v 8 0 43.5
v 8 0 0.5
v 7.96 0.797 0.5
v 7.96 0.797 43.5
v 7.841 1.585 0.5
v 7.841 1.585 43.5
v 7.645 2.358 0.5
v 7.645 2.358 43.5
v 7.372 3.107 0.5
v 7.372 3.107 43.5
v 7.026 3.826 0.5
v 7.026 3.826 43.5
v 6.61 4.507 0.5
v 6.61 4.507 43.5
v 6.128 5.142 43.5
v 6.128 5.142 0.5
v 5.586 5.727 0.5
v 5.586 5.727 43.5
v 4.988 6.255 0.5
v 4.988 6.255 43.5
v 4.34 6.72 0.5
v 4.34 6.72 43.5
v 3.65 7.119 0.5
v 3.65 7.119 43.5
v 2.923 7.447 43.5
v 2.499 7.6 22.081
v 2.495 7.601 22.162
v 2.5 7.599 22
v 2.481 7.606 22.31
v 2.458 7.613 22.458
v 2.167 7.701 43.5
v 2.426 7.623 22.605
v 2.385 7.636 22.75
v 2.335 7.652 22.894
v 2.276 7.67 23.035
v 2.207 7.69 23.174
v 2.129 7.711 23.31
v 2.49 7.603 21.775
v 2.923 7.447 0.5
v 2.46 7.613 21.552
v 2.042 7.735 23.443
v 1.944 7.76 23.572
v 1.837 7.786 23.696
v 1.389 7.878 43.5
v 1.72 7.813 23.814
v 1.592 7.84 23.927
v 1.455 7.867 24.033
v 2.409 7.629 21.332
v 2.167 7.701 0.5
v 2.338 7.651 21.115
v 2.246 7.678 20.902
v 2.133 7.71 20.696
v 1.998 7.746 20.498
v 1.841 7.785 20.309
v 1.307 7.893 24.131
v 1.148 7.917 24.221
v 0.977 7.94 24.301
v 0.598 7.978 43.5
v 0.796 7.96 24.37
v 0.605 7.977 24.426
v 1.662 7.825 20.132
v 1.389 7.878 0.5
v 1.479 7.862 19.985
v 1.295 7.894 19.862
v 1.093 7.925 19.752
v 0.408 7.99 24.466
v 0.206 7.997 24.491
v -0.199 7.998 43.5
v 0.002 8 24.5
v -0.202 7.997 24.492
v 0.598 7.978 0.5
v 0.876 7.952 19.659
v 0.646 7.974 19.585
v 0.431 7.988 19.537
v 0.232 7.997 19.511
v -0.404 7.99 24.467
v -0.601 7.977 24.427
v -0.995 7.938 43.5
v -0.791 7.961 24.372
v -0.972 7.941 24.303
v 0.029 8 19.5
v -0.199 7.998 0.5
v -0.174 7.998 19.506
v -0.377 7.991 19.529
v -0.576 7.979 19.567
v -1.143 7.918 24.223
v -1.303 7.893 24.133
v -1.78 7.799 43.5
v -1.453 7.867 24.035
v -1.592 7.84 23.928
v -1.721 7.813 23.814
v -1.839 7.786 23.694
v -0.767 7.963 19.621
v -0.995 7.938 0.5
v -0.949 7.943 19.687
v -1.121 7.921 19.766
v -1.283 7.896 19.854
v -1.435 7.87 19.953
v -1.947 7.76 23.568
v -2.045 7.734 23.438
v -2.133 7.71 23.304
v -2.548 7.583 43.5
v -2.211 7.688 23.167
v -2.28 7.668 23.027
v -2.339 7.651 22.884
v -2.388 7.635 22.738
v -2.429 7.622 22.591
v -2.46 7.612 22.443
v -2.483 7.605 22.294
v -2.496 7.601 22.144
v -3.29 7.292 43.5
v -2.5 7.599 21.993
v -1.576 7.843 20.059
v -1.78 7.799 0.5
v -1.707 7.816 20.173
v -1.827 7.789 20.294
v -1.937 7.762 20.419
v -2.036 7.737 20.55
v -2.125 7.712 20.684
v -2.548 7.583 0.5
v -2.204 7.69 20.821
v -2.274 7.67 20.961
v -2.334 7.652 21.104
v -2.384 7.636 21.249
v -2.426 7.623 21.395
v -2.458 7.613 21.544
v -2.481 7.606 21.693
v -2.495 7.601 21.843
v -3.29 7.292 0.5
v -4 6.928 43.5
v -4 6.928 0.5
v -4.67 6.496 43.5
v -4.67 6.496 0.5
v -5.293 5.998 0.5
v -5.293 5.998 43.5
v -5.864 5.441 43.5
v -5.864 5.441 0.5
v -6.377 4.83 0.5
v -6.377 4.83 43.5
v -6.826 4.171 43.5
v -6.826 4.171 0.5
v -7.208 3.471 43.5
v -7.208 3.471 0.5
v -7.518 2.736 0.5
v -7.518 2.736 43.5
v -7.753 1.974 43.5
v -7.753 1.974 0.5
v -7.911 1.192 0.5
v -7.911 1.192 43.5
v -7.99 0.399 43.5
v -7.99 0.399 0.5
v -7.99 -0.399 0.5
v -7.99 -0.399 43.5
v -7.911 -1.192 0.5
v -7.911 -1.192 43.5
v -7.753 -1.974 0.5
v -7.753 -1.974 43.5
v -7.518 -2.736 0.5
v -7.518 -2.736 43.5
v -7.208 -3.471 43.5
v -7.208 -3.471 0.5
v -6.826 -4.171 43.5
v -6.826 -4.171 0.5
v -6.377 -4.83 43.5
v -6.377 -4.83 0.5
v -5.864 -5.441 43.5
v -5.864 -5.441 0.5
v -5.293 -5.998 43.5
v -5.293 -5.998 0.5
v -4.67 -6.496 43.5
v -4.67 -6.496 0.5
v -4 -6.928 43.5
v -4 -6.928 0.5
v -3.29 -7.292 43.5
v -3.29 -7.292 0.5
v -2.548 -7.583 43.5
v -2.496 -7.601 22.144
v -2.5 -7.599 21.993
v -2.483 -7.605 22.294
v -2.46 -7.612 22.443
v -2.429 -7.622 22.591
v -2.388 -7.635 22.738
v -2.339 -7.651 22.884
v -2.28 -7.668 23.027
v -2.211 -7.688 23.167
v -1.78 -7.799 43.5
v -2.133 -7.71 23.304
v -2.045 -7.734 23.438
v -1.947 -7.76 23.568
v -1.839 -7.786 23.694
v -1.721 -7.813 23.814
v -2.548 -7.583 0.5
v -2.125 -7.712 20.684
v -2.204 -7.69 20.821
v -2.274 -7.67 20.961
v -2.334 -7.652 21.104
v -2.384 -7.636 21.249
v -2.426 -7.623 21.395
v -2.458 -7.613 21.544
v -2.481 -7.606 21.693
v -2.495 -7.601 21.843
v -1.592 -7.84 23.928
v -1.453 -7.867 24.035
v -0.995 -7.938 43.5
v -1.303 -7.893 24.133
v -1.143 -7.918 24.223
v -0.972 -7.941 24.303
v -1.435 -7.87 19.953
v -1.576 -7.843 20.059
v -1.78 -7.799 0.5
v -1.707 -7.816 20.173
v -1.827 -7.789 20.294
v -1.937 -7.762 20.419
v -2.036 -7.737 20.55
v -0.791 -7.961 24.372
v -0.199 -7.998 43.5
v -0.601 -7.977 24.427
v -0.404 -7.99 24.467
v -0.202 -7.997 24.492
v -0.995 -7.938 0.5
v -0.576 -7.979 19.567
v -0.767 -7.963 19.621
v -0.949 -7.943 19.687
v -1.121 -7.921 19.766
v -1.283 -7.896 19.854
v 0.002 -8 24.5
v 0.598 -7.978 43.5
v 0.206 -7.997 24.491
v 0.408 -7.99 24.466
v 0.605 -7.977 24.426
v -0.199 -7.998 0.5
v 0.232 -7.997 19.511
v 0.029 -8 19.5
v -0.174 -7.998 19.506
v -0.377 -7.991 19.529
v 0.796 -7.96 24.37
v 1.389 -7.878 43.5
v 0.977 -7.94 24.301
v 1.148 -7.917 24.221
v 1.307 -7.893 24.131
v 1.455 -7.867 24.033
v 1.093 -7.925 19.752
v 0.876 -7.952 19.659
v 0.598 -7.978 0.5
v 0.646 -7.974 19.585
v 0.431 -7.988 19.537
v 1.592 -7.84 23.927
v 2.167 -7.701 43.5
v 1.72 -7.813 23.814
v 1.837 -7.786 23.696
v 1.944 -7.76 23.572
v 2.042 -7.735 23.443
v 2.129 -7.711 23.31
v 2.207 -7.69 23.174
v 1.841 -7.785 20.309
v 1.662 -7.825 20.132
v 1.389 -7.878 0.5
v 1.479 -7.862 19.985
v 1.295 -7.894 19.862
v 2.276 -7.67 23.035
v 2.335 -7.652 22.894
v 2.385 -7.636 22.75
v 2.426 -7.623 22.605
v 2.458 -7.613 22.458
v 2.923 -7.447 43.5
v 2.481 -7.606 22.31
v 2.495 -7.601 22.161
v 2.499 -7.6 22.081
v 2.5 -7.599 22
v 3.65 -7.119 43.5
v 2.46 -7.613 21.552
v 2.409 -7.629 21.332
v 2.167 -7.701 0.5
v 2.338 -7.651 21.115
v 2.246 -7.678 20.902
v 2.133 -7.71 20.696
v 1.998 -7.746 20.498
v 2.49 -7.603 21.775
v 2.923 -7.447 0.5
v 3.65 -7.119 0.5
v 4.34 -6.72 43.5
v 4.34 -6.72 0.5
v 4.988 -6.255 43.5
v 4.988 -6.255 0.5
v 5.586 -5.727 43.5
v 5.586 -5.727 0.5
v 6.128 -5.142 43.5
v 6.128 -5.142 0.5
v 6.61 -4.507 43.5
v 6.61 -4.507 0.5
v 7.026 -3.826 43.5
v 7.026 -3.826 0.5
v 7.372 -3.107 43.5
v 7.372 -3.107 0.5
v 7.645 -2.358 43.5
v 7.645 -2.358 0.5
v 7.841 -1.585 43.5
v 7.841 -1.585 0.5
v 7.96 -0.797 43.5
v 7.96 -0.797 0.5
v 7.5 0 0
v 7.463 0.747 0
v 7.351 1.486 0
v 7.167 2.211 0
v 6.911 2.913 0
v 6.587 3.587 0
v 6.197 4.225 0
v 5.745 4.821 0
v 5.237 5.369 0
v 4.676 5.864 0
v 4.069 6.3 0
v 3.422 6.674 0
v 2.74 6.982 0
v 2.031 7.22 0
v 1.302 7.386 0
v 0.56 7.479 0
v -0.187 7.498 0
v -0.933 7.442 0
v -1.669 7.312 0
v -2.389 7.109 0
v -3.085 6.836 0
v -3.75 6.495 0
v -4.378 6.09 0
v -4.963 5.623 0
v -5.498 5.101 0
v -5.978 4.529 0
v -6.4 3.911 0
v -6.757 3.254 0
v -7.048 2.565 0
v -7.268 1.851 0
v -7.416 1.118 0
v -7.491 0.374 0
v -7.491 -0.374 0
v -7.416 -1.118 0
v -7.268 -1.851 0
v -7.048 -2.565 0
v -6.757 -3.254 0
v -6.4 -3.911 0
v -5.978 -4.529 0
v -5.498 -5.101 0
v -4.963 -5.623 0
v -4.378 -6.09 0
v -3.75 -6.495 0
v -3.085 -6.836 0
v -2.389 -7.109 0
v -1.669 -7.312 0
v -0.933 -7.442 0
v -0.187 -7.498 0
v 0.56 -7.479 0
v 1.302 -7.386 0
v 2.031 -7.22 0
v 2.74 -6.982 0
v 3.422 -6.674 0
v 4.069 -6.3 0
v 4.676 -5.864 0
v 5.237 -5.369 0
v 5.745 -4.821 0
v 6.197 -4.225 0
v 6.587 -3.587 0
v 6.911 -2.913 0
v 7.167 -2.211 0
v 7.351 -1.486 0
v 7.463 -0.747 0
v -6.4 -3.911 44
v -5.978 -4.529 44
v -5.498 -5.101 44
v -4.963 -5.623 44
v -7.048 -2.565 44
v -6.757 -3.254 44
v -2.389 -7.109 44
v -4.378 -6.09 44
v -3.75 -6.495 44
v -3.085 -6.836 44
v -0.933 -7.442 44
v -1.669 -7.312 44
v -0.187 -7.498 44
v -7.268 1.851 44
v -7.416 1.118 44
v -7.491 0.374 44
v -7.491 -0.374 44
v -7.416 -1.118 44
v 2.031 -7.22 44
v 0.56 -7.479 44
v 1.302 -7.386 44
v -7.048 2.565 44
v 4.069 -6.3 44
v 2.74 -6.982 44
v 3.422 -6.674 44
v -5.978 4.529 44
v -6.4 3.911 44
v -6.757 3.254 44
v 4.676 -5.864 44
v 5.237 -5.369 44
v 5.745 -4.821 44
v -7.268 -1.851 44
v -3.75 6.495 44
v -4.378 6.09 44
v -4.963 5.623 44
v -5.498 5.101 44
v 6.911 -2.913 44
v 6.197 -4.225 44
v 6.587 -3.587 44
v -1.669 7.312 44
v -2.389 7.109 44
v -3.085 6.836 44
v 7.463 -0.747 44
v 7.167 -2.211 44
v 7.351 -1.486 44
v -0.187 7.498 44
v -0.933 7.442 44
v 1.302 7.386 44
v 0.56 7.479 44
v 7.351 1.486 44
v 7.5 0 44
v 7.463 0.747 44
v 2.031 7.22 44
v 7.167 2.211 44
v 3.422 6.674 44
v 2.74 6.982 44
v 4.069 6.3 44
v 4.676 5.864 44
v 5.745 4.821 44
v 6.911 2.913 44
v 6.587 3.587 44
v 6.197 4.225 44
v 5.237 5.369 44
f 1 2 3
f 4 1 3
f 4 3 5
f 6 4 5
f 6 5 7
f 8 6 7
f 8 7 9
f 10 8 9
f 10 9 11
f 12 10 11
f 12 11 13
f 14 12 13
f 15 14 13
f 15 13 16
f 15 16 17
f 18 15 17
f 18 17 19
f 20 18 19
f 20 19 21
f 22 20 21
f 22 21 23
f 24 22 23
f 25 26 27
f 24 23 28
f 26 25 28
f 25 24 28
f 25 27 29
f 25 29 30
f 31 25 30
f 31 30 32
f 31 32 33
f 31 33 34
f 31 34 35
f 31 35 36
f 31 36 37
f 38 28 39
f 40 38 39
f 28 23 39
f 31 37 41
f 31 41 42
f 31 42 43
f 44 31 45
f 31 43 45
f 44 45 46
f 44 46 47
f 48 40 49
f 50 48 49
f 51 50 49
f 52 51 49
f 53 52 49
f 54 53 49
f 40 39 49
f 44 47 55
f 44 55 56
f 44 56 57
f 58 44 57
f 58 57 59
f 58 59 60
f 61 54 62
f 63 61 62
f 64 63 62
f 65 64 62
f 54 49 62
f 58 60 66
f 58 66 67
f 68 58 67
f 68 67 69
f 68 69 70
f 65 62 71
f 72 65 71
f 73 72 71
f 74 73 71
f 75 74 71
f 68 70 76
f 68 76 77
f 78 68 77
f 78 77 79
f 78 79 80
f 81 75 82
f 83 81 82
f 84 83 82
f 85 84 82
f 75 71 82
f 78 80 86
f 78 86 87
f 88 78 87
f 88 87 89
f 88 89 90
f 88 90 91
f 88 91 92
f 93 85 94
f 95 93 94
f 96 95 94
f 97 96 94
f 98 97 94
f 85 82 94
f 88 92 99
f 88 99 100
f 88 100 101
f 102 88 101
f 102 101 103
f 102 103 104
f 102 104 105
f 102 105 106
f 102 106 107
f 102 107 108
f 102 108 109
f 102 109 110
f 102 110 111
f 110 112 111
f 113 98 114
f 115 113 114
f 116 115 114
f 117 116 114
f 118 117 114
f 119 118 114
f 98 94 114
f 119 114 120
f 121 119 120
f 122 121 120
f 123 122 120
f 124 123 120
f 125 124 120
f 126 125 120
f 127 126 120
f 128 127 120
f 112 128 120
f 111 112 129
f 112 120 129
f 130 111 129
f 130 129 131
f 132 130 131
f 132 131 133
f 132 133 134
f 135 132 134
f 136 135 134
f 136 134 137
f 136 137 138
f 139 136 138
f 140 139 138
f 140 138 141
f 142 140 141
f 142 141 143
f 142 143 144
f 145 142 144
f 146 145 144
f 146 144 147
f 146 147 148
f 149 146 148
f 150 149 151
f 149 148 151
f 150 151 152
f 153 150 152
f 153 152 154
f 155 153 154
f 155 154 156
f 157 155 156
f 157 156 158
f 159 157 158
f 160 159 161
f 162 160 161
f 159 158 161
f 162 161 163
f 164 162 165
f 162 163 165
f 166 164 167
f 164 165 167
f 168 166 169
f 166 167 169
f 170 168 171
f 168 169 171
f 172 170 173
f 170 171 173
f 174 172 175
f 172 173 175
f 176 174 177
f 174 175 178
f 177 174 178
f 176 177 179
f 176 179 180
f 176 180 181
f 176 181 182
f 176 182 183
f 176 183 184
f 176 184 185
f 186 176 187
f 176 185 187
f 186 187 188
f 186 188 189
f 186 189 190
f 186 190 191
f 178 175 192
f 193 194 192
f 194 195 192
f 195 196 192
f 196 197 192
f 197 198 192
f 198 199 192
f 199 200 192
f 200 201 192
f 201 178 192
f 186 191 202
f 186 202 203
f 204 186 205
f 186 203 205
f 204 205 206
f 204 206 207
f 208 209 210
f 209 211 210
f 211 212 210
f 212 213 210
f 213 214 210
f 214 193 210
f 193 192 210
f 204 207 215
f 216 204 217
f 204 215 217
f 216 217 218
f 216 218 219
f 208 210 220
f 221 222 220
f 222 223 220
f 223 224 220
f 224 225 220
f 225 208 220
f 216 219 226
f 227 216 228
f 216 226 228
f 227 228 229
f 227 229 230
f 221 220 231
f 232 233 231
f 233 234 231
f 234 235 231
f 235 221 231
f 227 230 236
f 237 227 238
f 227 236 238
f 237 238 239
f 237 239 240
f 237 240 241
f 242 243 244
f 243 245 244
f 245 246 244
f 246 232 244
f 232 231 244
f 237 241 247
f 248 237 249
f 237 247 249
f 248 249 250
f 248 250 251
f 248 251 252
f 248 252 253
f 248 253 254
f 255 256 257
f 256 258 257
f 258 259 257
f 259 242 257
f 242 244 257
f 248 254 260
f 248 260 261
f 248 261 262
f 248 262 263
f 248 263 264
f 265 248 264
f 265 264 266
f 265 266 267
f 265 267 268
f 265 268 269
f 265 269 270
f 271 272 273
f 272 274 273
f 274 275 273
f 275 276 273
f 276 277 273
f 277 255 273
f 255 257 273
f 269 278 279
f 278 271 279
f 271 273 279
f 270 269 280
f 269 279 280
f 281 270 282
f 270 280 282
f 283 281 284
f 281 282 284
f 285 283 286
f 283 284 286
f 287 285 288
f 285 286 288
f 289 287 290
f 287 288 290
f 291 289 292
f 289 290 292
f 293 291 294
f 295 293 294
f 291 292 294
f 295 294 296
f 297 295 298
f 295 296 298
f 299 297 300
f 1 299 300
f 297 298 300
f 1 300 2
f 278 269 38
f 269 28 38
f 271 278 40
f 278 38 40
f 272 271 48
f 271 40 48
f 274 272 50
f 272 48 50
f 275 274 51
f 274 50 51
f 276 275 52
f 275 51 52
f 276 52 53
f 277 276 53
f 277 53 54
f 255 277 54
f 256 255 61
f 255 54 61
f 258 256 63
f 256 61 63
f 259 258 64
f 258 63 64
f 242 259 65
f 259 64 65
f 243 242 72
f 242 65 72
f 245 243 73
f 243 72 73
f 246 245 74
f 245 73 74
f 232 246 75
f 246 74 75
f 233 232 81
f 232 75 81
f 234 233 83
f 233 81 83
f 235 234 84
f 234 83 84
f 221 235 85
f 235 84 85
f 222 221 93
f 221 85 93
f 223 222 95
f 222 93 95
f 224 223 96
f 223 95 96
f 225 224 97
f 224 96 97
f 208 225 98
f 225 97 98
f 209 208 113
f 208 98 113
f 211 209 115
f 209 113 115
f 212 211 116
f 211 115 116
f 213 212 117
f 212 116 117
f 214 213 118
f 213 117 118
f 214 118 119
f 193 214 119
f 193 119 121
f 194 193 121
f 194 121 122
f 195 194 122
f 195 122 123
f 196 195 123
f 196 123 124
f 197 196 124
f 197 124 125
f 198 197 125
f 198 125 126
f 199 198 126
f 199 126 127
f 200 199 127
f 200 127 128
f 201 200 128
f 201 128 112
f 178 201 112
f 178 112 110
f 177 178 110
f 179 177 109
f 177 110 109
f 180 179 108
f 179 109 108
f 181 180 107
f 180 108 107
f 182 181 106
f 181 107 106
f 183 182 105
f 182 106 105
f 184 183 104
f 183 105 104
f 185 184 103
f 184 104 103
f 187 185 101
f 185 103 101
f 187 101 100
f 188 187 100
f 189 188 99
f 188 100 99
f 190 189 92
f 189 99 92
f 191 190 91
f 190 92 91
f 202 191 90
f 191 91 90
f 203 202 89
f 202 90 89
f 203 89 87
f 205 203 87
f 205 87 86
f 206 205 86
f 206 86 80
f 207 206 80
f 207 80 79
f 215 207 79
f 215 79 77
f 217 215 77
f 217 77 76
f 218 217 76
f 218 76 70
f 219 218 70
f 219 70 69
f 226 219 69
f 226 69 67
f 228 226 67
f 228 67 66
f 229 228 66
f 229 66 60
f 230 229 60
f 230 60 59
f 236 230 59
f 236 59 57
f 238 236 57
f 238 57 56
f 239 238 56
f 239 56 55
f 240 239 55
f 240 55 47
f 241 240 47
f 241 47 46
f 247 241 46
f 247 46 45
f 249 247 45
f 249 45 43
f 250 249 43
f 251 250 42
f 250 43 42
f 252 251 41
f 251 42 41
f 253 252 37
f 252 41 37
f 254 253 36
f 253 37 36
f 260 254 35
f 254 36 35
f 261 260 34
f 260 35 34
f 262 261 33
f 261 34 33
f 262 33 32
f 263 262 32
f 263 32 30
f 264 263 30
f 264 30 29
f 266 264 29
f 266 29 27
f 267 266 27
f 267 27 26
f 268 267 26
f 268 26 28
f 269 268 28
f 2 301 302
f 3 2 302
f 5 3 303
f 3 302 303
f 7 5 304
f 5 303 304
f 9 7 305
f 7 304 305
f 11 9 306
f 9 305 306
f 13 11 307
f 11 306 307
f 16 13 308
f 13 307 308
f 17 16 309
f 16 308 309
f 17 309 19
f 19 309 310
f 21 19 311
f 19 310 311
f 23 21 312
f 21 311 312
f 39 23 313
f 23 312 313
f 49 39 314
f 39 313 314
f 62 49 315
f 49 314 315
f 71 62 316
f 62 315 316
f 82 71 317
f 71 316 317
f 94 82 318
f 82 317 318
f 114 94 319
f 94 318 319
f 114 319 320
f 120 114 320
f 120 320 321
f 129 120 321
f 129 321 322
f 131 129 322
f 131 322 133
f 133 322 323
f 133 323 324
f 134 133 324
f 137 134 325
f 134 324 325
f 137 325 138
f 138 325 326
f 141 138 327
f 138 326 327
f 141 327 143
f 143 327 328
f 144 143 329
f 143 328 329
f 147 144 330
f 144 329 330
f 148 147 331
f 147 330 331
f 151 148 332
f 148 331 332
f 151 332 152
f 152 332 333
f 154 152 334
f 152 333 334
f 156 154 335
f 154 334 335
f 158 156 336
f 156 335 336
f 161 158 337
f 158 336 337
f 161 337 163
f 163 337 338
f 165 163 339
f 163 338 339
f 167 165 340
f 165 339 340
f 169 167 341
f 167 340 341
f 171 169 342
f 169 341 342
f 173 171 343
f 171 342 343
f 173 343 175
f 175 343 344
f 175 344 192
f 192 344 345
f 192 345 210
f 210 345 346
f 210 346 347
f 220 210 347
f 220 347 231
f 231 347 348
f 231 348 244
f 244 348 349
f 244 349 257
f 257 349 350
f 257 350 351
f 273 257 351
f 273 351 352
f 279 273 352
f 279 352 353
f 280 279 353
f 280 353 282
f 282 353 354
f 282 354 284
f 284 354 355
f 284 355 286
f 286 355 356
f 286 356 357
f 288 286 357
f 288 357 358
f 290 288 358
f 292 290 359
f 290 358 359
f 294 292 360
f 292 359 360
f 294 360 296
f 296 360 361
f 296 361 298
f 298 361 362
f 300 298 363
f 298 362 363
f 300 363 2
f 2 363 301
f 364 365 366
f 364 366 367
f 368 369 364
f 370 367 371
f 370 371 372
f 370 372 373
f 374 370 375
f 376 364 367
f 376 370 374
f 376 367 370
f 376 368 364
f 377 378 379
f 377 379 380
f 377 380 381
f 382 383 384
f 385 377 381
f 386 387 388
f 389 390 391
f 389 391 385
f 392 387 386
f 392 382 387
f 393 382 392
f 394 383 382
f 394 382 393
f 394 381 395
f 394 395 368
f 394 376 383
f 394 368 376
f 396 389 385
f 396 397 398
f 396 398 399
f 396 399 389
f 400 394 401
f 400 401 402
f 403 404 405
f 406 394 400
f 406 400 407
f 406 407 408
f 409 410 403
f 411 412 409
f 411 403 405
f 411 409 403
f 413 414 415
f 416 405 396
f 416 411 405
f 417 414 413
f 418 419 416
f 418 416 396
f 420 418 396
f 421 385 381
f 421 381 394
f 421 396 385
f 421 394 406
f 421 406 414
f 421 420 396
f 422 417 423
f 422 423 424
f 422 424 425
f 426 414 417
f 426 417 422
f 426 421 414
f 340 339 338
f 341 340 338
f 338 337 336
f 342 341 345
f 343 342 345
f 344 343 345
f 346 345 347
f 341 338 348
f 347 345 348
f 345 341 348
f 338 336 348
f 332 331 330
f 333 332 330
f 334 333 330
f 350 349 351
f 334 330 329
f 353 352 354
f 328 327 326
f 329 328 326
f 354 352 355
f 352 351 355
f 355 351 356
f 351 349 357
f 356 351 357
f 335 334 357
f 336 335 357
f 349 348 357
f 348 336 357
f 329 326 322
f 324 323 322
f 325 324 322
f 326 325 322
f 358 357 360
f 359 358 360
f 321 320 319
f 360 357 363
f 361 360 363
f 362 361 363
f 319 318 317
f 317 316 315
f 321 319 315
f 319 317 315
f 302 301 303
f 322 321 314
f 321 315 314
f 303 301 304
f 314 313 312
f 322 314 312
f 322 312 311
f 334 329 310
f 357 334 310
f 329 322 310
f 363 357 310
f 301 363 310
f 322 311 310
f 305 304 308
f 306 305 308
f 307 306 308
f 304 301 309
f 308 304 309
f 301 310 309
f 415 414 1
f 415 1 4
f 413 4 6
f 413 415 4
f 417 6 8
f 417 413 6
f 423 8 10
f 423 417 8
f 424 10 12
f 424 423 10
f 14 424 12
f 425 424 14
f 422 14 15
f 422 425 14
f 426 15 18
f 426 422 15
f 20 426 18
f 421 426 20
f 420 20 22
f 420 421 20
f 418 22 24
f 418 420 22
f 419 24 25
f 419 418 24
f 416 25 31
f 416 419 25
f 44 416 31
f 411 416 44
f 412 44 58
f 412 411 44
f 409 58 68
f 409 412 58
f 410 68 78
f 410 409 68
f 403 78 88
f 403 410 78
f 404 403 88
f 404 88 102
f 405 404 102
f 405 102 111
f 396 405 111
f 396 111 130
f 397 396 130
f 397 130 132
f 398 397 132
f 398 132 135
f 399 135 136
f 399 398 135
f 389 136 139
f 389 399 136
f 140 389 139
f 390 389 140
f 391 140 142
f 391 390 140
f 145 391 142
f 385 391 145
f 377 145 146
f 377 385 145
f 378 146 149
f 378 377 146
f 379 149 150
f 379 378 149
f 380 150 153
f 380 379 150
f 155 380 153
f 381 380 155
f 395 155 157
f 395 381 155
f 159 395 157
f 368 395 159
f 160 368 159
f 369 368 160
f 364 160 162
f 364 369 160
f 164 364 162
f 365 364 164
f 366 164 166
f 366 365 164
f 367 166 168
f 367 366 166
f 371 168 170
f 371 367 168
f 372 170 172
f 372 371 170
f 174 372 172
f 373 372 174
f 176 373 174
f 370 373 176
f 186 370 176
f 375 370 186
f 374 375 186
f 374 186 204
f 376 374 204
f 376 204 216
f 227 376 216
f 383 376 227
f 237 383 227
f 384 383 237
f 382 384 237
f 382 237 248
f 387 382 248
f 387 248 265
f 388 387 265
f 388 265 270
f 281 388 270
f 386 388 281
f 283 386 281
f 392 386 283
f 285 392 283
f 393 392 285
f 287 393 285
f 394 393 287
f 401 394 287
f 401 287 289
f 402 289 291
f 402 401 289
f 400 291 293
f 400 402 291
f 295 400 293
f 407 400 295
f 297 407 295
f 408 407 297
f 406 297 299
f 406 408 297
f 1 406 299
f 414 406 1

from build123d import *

# Parameters (mm, degrees)
SKETCH1_R               = 8
BOSS_EXTRUDE1_DEPTH     = 44
SKETCH2_R               = 2.5
CUT_EXTRUDE1_DEPTH      = 9
CUT_EXTRUDE1_DEPTH_BACK = 9
CHAMFER1_SIZE           = 0.5


with BuildPart() as part:
    # Sketch1 → Boss-Extrude1 (new body)
    with BuildSketch(Plane.XY):
        Circle(SKETCH1_R)
    extrude(amount=BOSS_EXTRUDE1_DEPTH)

    # Sketch2 → Cut-Extrude1 (cut, two sides)
    with BuildSketch(Plane(origin=(0, 0, 0), x_dir=(1, 0, 0), z_dir=(0, 1, 0))) as cut_extrude1_sk:
        with Locations((0, -22)):
            Circle(SKETCH2_R)
    extrude(amount=CUT_EXTRUDE1_DEPTH, mode=Mode.SUBTRACT)
    extrude(cut_extrude1_sk.sketch, amount=-CUT_EXTRUDE1_DEPTH_BACK, mode=Mode.SUBTRACT)

    # Chamfer1
    chamfer1_edges = [part.edges().sort_by_distance(p)[0] for p in [
        (-8, 0, 0),
        (-8, 0, 44),
    ]]
    chamfer(chamfer1_edges, length=CHAMFER1_SIZE)


solid = part.part
